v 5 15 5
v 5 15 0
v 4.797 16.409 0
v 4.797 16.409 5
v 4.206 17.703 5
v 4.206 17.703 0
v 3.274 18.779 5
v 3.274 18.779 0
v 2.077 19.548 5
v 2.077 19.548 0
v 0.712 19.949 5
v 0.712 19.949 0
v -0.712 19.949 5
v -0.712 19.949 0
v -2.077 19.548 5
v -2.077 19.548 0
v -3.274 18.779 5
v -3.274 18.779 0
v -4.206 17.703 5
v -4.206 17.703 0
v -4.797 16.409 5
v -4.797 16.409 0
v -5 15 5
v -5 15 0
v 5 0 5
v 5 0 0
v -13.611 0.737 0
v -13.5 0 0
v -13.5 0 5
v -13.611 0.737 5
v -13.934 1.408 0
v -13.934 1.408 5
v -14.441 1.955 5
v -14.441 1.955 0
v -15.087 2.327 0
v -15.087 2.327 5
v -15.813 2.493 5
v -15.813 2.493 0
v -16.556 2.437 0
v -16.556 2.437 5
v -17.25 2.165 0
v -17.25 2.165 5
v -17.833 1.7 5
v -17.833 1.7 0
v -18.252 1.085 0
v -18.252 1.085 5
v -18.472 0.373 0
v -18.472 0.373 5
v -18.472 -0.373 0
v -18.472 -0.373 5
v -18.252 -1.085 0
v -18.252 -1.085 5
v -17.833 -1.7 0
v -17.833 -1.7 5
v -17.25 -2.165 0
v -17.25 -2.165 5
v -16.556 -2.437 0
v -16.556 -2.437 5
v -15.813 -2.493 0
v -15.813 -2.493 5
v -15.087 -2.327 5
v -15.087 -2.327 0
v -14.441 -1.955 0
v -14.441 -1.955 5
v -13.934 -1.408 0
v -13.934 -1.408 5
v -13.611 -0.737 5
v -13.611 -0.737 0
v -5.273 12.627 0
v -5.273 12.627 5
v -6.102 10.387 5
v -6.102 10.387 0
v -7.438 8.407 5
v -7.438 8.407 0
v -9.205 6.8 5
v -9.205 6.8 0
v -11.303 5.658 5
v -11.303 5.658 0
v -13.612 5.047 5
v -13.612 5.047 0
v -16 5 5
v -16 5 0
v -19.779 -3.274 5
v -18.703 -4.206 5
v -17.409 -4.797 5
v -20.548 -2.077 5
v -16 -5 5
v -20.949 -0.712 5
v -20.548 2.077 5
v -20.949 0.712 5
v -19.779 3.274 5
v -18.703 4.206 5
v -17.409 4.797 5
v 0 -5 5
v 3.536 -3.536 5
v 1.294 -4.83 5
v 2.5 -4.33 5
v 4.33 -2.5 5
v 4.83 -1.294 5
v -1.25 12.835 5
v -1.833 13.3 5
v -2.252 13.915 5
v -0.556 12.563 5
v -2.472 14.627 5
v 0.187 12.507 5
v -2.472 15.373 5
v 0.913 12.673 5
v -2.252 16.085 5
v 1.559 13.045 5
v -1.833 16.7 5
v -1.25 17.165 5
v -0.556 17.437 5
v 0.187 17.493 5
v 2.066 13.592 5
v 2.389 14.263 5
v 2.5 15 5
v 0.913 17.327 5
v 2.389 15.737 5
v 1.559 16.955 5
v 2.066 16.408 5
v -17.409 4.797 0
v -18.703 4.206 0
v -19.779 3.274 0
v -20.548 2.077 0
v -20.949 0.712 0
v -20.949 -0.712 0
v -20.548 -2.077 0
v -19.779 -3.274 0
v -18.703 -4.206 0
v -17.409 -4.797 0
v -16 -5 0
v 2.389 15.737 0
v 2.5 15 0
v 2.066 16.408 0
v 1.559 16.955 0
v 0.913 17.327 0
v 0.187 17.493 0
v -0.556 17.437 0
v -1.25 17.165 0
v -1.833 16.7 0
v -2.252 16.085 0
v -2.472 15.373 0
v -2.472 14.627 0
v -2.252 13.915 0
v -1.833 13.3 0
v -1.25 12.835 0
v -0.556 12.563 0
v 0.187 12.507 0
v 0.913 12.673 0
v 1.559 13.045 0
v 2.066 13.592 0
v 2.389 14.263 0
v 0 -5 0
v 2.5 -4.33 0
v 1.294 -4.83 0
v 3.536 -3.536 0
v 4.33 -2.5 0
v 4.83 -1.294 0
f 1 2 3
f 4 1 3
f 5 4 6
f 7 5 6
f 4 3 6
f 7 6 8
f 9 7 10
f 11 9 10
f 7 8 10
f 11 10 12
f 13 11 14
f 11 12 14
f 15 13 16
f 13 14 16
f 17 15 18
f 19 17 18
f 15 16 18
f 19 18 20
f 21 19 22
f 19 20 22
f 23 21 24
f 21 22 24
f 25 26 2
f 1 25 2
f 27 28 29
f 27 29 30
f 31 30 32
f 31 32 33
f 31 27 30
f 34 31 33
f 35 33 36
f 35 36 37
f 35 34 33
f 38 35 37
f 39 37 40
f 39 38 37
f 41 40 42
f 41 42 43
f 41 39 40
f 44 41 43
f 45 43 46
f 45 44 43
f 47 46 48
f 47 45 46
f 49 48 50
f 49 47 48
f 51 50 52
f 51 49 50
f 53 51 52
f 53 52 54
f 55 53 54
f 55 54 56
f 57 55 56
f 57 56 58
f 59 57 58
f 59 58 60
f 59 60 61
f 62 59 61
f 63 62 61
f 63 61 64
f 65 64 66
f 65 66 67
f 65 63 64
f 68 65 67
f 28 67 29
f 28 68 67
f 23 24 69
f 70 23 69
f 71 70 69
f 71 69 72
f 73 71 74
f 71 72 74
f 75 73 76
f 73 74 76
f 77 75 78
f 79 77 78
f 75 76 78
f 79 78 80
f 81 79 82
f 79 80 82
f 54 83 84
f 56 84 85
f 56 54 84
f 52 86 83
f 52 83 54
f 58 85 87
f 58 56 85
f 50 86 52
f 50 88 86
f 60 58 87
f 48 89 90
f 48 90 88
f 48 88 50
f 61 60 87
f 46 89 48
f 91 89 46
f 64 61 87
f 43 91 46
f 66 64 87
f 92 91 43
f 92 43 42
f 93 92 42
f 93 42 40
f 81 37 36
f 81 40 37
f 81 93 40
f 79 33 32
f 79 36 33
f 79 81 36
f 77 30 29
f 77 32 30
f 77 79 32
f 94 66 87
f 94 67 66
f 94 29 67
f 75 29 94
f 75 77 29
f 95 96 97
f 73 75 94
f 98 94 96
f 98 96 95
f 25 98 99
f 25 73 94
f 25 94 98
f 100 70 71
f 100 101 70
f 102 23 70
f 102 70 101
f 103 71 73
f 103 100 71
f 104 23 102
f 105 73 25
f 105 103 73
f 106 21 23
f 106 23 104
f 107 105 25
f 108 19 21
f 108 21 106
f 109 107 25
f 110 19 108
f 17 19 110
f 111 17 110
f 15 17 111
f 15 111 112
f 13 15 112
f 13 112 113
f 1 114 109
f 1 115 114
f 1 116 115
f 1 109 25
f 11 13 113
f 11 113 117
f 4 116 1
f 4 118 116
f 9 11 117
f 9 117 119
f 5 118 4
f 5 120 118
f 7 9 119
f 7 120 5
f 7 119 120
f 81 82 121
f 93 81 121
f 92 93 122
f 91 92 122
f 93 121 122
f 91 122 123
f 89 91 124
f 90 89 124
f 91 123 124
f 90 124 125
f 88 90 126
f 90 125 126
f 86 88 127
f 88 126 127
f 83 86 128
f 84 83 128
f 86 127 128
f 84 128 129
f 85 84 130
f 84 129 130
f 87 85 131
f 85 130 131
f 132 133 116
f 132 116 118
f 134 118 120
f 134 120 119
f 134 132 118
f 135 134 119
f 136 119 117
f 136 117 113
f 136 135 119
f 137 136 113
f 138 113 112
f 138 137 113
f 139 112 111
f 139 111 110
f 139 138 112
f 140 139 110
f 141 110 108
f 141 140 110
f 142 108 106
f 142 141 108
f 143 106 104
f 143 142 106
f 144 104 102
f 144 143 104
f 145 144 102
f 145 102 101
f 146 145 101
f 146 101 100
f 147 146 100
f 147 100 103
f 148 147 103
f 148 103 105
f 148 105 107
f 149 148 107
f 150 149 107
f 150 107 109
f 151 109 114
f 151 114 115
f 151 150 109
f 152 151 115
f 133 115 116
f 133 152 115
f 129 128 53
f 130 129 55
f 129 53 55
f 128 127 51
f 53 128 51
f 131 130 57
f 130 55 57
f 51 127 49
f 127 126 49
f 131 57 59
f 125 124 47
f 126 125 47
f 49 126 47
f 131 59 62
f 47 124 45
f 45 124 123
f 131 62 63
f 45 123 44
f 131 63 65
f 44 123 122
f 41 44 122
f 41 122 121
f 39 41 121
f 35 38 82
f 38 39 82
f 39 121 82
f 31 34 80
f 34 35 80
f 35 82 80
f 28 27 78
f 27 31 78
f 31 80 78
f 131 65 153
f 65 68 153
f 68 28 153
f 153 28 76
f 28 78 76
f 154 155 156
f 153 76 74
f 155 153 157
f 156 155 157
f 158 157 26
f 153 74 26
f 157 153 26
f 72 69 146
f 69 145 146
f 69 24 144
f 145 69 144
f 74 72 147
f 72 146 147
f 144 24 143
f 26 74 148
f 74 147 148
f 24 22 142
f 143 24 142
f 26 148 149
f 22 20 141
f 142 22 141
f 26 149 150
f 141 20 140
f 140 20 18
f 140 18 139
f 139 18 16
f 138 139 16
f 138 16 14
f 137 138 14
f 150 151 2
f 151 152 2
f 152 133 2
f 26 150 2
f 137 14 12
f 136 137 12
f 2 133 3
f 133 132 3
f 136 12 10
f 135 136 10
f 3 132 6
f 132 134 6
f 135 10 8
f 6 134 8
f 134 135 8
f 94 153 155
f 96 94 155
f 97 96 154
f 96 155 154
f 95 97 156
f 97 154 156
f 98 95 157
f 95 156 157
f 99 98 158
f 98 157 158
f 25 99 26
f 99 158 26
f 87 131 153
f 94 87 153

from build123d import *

# Parameters (mm, degrees)
F0_R     = 2.5
F1_DEPTH = 5


with BuildPart() as f1:
    # F0 (on Top) → F1 (new body)
    with BuildSketch(Plane.XY):
        with BuildLine():
            Line((-16, -5), (0, -5))
            ThreePointArc((0, -5), (3.535534, -3.535534), (5, 0))
            Line((5, 0), (5, 15))
            ThreePointArc((5, 15), (0, 20), (-5, 15))
            ThreePointArc((-5, 15), (-8.273146, 7.550461), (-16, 5))
            ThreePointArc((-16, 5), (-21, 0), (-16, -5))
        make_face()
        with Locations((-16, 0)):
            Circle(F0_R, mode=Mode.SUBTRACT)
        with Locations((0, 15)):
            Circle(F0_R, mode=Mode.SUBTRACT)
    extrude(amount=F1_DEPTH)


solid = f1.part
